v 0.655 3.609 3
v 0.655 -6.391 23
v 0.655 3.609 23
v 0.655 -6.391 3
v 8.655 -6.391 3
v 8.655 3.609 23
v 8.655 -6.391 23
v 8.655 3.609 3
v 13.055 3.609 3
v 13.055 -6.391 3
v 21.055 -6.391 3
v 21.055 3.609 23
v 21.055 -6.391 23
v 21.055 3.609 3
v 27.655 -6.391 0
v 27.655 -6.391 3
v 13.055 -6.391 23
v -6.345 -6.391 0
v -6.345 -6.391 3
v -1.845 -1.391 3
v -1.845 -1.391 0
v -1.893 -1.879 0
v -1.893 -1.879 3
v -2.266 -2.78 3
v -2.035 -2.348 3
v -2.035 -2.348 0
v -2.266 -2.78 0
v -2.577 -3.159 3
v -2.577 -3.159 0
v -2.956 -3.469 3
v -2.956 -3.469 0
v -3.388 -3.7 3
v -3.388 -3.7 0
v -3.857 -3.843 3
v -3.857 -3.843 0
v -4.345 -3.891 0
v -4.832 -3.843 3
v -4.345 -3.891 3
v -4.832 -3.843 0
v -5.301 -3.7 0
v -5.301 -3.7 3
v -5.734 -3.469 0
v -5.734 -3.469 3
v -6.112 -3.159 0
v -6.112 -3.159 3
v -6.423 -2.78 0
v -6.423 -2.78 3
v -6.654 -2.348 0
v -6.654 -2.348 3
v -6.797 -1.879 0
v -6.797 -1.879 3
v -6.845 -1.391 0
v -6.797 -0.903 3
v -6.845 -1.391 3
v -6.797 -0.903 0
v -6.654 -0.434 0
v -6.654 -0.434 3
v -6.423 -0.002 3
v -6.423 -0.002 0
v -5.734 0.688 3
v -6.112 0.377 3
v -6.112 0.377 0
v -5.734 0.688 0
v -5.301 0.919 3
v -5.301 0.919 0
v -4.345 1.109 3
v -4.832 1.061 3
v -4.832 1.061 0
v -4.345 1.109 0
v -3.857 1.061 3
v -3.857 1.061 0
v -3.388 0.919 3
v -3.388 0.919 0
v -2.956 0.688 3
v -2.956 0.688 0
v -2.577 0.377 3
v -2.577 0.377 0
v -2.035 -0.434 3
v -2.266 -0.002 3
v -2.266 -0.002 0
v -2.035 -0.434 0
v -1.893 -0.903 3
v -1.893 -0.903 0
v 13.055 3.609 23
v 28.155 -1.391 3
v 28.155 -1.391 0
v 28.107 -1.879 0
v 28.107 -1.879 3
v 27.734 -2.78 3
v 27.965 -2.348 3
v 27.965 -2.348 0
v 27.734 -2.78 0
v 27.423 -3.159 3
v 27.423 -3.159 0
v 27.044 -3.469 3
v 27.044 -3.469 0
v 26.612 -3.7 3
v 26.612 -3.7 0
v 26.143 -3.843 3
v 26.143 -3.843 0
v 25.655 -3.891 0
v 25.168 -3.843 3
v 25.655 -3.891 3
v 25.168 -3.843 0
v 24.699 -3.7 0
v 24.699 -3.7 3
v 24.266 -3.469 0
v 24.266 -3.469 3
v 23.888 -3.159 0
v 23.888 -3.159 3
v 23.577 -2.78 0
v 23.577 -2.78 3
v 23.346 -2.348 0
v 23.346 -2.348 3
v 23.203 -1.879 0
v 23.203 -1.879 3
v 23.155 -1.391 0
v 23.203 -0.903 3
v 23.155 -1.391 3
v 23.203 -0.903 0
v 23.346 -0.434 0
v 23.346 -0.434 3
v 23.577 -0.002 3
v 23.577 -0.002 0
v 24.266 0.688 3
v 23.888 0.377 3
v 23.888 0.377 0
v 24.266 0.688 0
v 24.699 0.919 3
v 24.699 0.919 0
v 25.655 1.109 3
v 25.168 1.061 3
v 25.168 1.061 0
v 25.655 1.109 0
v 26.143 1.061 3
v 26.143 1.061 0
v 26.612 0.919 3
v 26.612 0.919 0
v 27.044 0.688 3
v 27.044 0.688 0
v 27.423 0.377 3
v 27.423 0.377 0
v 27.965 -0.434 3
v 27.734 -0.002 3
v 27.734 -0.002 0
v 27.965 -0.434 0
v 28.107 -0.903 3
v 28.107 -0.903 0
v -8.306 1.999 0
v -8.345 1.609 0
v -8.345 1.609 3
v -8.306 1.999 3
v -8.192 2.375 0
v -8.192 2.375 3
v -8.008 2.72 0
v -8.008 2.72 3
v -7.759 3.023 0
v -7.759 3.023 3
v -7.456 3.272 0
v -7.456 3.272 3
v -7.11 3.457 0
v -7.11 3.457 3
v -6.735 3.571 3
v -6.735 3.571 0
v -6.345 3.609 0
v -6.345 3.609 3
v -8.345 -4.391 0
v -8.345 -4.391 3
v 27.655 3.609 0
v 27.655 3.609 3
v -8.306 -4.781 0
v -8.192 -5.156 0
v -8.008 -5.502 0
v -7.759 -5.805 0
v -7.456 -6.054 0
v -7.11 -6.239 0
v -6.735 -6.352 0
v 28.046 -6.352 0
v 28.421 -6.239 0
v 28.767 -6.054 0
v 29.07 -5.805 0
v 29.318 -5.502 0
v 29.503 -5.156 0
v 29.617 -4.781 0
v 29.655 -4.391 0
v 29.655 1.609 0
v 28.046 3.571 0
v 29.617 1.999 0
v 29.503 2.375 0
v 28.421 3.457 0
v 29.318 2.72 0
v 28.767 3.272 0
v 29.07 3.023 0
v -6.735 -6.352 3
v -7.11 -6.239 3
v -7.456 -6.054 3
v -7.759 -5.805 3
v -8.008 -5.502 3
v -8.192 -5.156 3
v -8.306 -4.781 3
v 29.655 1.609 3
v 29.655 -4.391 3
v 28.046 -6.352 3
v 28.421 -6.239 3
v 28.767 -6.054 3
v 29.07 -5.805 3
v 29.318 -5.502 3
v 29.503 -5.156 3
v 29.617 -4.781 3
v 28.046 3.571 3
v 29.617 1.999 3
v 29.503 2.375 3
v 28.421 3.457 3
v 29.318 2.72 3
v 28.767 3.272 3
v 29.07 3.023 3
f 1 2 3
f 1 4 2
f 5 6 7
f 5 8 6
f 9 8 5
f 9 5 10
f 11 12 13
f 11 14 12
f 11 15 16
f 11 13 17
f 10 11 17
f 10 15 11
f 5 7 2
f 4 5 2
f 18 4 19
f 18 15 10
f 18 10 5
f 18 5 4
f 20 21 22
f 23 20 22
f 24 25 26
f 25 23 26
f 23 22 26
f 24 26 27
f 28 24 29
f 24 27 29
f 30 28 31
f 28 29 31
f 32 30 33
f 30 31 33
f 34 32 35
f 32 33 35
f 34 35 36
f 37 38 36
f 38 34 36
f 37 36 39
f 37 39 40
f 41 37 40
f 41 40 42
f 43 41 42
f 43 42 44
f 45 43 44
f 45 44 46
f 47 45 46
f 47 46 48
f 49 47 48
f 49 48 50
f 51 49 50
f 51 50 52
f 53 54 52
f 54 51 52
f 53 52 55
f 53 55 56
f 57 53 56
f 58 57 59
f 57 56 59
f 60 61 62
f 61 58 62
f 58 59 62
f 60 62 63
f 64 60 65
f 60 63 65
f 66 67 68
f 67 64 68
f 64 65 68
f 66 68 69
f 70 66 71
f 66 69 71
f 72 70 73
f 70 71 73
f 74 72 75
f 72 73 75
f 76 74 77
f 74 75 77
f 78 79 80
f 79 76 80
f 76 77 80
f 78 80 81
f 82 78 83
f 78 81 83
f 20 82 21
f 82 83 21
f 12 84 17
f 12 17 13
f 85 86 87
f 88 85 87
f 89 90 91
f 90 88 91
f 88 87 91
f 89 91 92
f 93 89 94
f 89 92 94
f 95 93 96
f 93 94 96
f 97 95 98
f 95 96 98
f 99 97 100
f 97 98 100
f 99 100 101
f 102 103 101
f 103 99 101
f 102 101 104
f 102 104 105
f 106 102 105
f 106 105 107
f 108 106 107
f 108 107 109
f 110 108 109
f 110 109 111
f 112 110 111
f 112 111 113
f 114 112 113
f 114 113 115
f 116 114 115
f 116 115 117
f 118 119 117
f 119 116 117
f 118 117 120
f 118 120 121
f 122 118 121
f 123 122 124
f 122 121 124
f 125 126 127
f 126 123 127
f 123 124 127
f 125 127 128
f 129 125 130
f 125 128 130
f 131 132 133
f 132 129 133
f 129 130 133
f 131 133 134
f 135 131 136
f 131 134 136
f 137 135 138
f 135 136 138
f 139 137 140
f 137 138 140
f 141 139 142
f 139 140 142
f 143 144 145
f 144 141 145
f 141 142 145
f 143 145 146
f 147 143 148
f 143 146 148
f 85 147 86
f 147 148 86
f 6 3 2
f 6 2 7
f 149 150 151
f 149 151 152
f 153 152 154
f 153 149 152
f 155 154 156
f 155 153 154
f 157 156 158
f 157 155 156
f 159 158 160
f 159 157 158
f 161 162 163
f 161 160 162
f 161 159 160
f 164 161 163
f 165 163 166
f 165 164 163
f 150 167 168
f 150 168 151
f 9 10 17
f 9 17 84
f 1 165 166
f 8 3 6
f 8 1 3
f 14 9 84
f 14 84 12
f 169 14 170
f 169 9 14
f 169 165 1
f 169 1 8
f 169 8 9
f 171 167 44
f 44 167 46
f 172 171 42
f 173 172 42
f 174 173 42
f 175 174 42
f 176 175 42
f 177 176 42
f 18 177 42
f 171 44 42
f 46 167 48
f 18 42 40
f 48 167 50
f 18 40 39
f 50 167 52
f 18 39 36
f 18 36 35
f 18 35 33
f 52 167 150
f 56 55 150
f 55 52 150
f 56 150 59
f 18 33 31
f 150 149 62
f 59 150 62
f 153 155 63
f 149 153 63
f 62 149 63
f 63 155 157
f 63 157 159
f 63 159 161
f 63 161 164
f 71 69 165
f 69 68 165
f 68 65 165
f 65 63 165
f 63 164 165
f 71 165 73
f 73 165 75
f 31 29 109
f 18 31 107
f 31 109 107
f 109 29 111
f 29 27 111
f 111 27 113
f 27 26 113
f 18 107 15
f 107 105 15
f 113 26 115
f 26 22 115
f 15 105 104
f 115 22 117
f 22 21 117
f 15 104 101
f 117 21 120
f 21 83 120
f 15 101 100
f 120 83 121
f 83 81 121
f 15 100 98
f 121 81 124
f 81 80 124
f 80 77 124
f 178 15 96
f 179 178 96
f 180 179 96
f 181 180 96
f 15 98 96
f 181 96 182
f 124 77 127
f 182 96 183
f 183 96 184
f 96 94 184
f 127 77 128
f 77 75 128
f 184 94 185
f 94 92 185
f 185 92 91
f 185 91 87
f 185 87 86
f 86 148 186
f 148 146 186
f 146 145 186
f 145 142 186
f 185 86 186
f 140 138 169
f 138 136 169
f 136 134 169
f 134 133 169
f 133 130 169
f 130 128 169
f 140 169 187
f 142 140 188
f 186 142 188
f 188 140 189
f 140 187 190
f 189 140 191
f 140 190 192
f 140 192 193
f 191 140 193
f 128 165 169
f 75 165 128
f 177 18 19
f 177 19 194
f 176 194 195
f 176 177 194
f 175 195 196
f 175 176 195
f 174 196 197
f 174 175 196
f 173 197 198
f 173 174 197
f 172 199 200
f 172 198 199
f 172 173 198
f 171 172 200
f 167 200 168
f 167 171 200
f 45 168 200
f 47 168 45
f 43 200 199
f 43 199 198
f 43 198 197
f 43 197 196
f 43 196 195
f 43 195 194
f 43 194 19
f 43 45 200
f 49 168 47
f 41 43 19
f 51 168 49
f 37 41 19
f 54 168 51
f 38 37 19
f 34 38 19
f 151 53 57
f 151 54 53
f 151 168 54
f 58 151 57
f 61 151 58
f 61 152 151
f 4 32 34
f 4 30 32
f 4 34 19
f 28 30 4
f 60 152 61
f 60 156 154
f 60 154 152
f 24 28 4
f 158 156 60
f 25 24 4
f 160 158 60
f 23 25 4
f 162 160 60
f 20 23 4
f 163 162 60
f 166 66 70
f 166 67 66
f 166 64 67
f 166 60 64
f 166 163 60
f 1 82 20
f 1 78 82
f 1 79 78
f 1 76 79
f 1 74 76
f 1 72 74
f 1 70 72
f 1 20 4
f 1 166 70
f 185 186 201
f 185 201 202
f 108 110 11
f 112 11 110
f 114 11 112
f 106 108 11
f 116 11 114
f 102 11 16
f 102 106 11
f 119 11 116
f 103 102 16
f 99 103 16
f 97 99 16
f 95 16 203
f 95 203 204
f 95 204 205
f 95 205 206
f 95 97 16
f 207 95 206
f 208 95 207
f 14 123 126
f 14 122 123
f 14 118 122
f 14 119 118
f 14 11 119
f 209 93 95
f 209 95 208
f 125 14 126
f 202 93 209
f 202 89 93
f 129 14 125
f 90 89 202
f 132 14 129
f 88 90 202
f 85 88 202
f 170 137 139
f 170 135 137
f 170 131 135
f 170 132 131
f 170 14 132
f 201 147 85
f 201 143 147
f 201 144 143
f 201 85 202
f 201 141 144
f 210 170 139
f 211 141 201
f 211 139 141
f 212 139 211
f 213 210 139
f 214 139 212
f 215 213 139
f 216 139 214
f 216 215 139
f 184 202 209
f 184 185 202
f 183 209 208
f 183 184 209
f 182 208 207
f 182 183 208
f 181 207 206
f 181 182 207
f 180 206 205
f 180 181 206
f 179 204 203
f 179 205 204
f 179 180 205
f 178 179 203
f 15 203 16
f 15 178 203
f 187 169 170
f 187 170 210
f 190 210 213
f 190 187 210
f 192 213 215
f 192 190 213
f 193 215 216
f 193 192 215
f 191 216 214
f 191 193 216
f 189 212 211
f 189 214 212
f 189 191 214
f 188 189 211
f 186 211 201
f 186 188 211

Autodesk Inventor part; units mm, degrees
ref_plane "YZ Plane" through (0, 0, 0) normal (1, 0, 0) x (0, 1, 0)
ref_plane "XZ Plane" through (0, 0, 0) normal (0, 1, 0) x (-1, 0, 0)
ref_plane "XY Plane" through (0, 0, 0) normal (0, 0, 1) x (1, 0, 0)
sketch "Náčrt1" plane through (0, 0, 0) normal (0, 0, 1) x (1, 0, 0)
  line L0 (-6.3446, 3.6092) -> (27.6554, 3.6092)
  line L1 (29.6554, 1.6092) -> (29.6554, -4.3908)
  line L2 (27.6554, -6.3908) -> (-6.3446, -6.3908)
  line L3 (-8.3446, -4.3908) -> (-8.3446, 1.6092)
  circle A0 centre (-4.3446, -1.3908) radius 2.5
  circle A1 centre (25.6554, -1.3908) radius 2.5
  arc A2 (-6.3446, 3.6092) -> (-8.3446, 1.6092) centre (-6.3446, 1.6092) ccw
  arc A3 (29.6554, 1.6092) -> (27.6554, 3.6092) centre (27.6554, 1.6092) ccw
  arc A4 (27.6554, -6.3908) -> (29.6554, -4.3908) centre (27.6554, -4.3908) ccw
  arc A5 (-8.3446, -4.3908) -> (-6.3446, -6.3908) centre (-6.3446, -4.3908) ccw
  point P0 (0, 0)
  point P1 (-8.3446, 3.6092)
  point P2 (29.6554, 3.6092)
  point P3 (-8.3446, -6.3908)
  dimension "d0" = 38
  dimension "d1" = 10
  dimension "d2" = 5
  dimension "d3" = 5
  dimension "d4" = 5
  dimension "d5" = 5
  dimension "d6" = 4
  dimension "d7" = 4
  dimension "d8" = 2
extrude "Vysunutí1" add sketch "Náčrt1" along normal blind 3
sketch "Náčrt2" plane through (0, 0, 3) normal (0, 0, 1) x (1, 0, 0)
  line L0 (0.6554, 3.6092) -> (8.6554, 3.6092)
  line L1 (8.6554, 3.6092) -> (8.6554, -6.3908)
  line L2 (8.6554, -6.3908) -> (0.6554, -6.3908)
  line L3 (0.6554, -6.3908) -> (0.6554, 3.6092)
  line L4 (13.0554, 3.6092) -> (21.0554, 3.6092)
  line L5 (21.0554, 3.6092) -> (21.0554, -6.3908)
  line L6 (21.0554, -6.3908) -> (13.0554, -6.3908)
  line L7 (13.0554, -6.3908) -> (13.0554, 3.6092)
  line L8 (-8.3446, 1.6092) -> (-8.3446, -4.3908) projected
  line L9 (-6.3446, -6.3908) -> (27.6554, -6.3908) projected
  line L10 (27.6554, 3.6092) -> (-6.3446, 3.6092) projected
  point P0 (0, 0)
  point P1 (4.6554, -6.3908)
  dimension "d11" = 4.4
  dimension "d12" = 8
  dimension "d13" = 8
  dimension "d14" = 9
  dimension "d15" = 10
  dimension "d16" = 0
  dimension "d21" = 0
extrude "Vysunutí2" add sketch "Náčrt2" along normal blind 20 contours L0 L1 L2 L3 | L4 L5 L6 L7
properties part number "uchytka"
